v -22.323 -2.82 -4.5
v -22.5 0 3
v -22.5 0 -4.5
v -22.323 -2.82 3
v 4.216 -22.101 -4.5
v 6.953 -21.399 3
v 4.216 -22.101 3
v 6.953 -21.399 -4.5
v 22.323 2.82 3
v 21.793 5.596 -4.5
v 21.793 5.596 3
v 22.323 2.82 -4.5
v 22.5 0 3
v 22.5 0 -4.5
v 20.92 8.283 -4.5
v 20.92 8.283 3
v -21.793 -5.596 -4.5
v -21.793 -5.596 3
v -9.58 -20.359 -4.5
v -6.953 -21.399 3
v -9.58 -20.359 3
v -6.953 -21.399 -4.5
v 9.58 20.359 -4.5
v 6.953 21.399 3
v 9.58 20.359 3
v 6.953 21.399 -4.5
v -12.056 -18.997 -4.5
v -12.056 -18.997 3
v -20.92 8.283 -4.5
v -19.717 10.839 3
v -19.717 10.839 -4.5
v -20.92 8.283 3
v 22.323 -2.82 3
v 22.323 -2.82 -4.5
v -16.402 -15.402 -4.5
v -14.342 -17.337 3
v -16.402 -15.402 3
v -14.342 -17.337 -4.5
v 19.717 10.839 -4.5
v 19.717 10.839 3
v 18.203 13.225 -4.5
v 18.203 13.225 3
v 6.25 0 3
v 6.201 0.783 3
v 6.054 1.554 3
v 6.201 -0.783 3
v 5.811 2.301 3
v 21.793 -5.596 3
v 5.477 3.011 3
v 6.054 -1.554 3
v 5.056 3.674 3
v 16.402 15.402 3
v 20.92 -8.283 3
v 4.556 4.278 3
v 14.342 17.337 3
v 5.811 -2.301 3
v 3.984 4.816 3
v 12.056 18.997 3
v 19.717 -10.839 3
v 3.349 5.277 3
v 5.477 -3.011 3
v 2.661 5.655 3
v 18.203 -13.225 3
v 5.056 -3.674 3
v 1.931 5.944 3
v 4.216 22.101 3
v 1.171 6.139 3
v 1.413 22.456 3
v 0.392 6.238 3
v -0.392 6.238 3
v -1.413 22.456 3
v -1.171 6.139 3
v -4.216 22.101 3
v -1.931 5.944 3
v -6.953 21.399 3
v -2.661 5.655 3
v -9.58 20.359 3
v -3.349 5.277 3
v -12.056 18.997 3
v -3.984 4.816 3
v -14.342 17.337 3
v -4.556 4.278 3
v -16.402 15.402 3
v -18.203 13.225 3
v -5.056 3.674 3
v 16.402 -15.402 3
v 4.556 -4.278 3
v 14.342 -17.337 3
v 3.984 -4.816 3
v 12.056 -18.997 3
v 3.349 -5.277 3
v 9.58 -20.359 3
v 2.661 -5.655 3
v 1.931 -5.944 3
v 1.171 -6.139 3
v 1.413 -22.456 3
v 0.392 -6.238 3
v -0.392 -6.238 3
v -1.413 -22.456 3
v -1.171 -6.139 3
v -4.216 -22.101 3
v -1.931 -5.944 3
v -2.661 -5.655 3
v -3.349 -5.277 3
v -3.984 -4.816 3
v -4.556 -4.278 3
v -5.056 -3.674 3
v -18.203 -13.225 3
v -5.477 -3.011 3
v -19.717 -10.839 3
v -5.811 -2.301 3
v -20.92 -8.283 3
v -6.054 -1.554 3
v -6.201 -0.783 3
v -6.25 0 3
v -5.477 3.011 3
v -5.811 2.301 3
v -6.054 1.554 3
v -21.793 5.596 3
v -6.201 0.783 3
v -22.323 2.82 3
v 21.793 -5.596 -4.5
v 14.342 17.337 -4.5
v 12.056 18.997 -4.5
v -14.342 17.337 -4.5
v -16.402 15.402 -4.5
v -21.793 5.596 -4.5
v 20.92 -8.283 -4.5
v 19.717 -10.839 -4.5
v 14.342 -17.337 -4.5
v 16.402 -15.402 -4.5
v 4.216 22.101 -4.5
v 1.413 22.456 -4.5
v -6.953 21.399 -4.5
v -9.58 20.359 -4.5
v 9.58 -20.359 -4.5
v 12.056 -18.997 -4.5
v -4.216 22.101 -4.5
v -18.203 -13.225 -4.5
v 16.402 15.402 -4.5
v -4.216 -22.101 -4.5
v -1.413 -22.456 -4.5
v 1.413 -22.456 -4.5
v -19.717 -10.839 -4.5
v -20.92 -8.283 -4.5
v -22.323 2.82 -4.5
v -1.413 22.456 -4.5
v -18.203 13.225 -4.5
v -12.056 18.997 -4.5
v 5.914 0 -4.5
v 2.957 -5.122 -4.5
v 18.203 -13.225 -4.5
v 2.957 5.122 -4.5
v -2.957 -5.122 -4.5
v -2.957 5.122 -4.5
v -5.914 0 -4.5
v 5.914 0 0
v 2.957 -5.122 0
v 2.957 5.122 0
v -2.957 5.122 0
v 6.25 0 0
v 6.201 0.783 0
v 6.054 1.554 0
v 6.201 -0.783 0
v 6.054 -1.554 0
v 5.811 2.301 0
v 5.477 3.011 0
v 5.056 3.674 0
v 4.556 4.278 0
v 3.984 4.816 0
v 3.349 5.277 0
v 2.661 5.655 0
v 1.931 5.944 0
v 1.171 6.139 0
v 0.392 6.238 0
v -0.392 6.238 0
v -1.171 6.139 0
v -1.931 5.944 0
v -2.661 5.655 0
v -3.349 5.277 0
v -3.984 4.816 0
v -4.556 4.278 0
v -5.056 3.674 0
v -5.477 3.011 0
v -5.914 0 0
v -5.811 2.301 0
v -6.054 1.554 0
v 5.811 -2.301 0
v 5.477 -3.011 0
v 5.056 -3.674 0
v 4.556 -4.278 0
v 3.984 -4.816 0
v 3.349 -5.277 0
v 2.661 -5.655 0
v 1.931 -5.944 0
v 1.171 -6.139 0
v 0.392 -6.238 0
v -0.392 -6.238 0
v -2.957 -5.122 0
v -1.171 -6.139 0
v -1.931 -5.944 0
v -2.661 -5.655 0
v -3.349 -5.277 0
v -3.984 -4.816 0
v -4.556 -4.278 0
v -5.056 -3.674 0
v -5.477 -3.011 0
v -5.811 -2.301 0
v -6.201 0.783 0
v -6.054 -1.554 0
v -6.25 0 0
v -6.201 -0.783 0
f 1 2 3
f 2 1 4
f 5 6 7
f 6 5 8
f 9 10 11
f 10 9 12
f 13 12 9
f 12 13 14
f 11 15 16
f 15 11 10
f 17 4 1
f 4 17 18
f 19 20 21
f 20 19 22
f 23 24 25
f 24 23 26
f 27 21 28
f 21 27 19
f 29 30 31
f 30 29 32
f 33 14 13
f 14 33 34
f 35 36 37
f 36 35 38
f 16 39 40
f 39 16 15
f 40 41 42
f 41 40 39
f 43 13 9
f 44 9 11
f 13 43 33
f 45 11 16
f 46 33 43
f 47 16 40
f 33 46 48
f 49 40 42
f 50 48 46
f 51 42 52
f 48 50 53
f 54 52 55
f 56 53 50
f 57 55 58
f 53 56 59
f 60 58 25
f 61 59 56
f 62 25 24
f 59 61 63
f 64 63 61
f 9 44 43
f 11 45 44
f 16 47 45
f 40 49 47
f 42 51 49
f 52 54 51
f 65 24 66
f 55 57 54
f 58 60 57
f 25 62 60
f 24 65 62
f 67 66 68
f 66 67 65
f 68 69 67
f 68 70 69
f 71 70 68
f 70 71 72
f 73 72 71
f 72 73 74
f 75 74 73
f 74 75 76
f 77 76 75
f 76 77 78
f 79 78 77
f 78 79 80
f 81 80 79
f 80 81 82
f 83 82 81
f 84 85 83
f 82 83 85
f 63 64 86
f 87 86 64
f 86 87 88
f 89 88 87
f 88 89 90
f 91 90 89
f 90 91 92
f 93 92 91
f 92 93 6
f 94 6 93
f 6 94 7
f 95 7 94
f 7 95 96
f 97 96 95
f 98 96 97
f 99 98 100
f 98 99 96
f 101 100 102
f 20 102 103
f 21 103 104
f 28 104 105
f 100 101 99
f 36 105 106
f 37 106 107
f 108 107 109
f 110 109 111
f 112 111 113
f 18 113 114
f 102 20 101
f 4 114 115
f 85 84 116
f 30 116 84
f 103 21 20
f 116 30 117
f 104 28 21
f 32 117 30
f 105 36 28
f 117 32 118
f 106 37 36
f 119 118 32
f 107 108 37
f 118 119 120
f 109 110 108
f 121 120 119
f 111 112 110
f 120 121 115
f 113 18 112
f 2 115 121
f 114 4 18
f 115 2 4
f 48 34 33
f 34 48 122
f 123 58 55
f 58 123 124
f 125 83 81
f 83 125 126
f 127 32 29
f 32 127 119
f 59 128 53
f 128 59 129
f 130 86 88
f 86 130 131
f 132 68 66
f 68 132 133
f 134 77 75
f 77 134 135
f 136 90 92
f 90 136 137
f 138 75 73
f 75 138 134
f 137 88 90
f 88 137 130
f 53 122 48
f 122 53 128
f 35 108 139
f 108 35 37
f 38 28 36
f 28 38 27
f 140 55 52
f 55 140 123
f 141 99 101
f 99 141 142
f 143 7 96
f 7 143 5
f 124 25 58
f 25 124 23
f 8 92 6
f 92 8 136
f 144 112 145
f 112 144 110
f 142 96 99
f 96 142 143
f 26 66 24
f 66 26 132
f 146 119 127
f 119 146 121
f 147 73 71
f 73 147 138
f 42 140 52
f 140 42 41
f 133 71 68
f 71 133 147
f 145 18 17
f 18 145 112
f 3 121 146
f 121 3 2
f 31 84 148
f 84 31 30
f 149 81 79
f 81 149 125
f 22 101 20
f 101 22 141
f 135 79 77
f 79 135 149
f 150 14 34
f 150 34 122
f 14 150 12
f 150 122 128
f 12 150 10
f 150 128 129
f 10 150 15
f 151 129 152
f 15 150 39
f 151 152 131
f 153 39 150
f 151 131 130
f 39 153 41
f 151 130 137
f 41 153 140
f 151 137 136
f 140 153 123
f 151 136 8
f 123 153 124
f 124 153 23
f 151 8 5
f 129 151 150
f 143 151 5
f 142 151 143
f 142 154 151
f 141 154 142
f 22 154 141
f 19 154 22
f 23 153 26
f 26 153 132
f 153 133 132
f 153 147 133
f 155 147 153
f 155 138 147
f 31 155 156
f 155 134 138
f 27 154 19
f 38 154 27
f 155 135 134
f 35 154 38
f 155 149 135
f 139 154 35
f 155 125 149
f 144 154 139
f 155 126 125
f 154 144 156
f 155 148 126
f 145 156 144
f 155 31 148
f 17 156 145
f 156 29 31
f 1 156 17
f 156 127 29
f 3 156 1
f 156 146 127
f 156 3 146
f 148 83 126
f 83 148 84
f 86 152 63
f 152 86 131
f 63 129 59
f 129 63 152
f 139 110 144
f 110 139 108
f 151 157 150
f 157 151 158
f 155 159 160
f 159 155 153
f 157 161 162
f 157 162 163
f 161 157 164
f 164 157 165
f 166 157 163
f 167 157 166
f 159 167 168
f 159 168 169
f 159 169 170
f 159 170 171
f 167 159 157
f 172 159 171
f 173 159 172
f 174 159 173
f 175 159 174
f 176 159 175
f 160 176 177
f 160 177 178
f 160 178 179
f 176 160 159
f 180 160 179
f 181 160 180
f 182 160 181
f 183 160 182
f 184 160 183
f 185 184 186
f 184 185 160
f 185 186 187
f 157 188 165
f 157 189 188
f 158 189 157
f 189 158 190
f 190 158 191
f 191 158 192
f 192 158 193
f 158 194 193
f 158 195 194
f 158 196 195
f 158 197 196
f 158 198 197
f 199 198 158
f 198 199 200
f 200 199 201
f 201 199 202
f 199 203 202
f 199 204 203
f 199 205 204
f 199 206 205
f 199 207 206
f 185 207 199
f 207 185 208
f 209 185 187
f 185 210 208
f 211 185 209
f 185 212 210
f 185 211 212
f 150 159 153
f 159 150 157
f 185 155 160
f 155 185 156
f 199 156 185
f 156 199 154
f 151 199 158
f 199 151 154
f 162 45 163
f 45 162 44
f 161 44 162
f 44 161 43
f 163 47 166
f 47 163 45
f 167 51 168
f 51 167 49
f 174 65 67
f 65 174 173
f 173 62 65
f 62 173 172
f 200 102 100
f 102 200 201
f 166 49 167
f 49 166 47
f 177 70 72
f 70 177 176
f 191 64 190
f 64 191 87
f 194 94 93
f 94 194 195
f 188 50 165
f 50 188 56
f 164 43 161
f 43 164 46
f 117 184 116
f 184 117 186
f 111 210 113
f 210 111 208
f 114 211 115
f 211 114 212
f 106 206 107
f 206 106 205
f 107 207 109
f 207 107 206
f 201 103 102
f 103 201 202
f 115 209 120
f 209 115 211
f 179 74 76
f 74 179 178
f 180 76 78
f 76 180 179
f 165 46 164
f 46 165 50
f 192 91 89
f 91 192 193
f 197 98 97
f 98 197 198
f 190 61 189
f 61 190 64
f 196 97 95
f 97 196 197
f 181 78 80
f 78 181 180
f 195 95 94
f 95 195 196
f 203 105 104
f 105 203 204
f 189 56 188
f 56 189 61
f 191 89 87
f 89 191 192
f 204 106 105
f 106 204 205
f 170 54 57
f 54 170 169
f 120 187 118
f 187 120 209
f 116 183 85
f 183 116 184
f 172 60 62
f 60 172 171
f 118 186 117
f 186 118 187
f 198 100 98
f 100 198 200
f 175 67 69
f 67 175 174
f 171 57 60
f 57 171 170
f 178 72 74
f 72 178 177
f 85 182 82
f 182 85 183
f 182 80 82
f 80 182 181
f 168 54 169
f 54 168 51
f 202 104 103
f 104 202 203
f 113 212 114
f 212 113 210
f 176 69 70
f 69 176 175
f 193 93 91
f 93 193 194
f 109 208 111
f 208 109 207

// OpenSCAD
$fn = 50;


difference() {
	union() {
		translate(v = [0, 0, -4.5000000000]) {
			cylinder(h = 7.5000000000, r = 22.5000000000);
		}
		#translate(v = [0, 0, -6.0000000000]) {
			cylinder(h = 6, r = 2.8750000000);
		}
	}
	union() {
		translate(v = [0, 0, 0]) {
			rotate(a = [0, 0, 0]) {
				difference() {
					union() {
						translate(v = [0, 0, -5]) {
							linear_extrude(height = 5) {
								polygon(points = [[5.9142500000, 0.0000000000], [2.9571250000, 5.1218907443], [-2.9571250000, 5.1218907443], [-5.9142500000, 0.0000000000], [-2.9571250000, -5.1218907443], [2.9571250000, -5.1218907443]]);
							}
						}
					}
					union();
				}
			}
		}
		#cylinder(h = 3, r = 6.2500000000);
		#translate(v = [0, 0, -100.0000000000]) {
			cylinder(h = 200, r = 3.2500000000);
		}
	}
}
